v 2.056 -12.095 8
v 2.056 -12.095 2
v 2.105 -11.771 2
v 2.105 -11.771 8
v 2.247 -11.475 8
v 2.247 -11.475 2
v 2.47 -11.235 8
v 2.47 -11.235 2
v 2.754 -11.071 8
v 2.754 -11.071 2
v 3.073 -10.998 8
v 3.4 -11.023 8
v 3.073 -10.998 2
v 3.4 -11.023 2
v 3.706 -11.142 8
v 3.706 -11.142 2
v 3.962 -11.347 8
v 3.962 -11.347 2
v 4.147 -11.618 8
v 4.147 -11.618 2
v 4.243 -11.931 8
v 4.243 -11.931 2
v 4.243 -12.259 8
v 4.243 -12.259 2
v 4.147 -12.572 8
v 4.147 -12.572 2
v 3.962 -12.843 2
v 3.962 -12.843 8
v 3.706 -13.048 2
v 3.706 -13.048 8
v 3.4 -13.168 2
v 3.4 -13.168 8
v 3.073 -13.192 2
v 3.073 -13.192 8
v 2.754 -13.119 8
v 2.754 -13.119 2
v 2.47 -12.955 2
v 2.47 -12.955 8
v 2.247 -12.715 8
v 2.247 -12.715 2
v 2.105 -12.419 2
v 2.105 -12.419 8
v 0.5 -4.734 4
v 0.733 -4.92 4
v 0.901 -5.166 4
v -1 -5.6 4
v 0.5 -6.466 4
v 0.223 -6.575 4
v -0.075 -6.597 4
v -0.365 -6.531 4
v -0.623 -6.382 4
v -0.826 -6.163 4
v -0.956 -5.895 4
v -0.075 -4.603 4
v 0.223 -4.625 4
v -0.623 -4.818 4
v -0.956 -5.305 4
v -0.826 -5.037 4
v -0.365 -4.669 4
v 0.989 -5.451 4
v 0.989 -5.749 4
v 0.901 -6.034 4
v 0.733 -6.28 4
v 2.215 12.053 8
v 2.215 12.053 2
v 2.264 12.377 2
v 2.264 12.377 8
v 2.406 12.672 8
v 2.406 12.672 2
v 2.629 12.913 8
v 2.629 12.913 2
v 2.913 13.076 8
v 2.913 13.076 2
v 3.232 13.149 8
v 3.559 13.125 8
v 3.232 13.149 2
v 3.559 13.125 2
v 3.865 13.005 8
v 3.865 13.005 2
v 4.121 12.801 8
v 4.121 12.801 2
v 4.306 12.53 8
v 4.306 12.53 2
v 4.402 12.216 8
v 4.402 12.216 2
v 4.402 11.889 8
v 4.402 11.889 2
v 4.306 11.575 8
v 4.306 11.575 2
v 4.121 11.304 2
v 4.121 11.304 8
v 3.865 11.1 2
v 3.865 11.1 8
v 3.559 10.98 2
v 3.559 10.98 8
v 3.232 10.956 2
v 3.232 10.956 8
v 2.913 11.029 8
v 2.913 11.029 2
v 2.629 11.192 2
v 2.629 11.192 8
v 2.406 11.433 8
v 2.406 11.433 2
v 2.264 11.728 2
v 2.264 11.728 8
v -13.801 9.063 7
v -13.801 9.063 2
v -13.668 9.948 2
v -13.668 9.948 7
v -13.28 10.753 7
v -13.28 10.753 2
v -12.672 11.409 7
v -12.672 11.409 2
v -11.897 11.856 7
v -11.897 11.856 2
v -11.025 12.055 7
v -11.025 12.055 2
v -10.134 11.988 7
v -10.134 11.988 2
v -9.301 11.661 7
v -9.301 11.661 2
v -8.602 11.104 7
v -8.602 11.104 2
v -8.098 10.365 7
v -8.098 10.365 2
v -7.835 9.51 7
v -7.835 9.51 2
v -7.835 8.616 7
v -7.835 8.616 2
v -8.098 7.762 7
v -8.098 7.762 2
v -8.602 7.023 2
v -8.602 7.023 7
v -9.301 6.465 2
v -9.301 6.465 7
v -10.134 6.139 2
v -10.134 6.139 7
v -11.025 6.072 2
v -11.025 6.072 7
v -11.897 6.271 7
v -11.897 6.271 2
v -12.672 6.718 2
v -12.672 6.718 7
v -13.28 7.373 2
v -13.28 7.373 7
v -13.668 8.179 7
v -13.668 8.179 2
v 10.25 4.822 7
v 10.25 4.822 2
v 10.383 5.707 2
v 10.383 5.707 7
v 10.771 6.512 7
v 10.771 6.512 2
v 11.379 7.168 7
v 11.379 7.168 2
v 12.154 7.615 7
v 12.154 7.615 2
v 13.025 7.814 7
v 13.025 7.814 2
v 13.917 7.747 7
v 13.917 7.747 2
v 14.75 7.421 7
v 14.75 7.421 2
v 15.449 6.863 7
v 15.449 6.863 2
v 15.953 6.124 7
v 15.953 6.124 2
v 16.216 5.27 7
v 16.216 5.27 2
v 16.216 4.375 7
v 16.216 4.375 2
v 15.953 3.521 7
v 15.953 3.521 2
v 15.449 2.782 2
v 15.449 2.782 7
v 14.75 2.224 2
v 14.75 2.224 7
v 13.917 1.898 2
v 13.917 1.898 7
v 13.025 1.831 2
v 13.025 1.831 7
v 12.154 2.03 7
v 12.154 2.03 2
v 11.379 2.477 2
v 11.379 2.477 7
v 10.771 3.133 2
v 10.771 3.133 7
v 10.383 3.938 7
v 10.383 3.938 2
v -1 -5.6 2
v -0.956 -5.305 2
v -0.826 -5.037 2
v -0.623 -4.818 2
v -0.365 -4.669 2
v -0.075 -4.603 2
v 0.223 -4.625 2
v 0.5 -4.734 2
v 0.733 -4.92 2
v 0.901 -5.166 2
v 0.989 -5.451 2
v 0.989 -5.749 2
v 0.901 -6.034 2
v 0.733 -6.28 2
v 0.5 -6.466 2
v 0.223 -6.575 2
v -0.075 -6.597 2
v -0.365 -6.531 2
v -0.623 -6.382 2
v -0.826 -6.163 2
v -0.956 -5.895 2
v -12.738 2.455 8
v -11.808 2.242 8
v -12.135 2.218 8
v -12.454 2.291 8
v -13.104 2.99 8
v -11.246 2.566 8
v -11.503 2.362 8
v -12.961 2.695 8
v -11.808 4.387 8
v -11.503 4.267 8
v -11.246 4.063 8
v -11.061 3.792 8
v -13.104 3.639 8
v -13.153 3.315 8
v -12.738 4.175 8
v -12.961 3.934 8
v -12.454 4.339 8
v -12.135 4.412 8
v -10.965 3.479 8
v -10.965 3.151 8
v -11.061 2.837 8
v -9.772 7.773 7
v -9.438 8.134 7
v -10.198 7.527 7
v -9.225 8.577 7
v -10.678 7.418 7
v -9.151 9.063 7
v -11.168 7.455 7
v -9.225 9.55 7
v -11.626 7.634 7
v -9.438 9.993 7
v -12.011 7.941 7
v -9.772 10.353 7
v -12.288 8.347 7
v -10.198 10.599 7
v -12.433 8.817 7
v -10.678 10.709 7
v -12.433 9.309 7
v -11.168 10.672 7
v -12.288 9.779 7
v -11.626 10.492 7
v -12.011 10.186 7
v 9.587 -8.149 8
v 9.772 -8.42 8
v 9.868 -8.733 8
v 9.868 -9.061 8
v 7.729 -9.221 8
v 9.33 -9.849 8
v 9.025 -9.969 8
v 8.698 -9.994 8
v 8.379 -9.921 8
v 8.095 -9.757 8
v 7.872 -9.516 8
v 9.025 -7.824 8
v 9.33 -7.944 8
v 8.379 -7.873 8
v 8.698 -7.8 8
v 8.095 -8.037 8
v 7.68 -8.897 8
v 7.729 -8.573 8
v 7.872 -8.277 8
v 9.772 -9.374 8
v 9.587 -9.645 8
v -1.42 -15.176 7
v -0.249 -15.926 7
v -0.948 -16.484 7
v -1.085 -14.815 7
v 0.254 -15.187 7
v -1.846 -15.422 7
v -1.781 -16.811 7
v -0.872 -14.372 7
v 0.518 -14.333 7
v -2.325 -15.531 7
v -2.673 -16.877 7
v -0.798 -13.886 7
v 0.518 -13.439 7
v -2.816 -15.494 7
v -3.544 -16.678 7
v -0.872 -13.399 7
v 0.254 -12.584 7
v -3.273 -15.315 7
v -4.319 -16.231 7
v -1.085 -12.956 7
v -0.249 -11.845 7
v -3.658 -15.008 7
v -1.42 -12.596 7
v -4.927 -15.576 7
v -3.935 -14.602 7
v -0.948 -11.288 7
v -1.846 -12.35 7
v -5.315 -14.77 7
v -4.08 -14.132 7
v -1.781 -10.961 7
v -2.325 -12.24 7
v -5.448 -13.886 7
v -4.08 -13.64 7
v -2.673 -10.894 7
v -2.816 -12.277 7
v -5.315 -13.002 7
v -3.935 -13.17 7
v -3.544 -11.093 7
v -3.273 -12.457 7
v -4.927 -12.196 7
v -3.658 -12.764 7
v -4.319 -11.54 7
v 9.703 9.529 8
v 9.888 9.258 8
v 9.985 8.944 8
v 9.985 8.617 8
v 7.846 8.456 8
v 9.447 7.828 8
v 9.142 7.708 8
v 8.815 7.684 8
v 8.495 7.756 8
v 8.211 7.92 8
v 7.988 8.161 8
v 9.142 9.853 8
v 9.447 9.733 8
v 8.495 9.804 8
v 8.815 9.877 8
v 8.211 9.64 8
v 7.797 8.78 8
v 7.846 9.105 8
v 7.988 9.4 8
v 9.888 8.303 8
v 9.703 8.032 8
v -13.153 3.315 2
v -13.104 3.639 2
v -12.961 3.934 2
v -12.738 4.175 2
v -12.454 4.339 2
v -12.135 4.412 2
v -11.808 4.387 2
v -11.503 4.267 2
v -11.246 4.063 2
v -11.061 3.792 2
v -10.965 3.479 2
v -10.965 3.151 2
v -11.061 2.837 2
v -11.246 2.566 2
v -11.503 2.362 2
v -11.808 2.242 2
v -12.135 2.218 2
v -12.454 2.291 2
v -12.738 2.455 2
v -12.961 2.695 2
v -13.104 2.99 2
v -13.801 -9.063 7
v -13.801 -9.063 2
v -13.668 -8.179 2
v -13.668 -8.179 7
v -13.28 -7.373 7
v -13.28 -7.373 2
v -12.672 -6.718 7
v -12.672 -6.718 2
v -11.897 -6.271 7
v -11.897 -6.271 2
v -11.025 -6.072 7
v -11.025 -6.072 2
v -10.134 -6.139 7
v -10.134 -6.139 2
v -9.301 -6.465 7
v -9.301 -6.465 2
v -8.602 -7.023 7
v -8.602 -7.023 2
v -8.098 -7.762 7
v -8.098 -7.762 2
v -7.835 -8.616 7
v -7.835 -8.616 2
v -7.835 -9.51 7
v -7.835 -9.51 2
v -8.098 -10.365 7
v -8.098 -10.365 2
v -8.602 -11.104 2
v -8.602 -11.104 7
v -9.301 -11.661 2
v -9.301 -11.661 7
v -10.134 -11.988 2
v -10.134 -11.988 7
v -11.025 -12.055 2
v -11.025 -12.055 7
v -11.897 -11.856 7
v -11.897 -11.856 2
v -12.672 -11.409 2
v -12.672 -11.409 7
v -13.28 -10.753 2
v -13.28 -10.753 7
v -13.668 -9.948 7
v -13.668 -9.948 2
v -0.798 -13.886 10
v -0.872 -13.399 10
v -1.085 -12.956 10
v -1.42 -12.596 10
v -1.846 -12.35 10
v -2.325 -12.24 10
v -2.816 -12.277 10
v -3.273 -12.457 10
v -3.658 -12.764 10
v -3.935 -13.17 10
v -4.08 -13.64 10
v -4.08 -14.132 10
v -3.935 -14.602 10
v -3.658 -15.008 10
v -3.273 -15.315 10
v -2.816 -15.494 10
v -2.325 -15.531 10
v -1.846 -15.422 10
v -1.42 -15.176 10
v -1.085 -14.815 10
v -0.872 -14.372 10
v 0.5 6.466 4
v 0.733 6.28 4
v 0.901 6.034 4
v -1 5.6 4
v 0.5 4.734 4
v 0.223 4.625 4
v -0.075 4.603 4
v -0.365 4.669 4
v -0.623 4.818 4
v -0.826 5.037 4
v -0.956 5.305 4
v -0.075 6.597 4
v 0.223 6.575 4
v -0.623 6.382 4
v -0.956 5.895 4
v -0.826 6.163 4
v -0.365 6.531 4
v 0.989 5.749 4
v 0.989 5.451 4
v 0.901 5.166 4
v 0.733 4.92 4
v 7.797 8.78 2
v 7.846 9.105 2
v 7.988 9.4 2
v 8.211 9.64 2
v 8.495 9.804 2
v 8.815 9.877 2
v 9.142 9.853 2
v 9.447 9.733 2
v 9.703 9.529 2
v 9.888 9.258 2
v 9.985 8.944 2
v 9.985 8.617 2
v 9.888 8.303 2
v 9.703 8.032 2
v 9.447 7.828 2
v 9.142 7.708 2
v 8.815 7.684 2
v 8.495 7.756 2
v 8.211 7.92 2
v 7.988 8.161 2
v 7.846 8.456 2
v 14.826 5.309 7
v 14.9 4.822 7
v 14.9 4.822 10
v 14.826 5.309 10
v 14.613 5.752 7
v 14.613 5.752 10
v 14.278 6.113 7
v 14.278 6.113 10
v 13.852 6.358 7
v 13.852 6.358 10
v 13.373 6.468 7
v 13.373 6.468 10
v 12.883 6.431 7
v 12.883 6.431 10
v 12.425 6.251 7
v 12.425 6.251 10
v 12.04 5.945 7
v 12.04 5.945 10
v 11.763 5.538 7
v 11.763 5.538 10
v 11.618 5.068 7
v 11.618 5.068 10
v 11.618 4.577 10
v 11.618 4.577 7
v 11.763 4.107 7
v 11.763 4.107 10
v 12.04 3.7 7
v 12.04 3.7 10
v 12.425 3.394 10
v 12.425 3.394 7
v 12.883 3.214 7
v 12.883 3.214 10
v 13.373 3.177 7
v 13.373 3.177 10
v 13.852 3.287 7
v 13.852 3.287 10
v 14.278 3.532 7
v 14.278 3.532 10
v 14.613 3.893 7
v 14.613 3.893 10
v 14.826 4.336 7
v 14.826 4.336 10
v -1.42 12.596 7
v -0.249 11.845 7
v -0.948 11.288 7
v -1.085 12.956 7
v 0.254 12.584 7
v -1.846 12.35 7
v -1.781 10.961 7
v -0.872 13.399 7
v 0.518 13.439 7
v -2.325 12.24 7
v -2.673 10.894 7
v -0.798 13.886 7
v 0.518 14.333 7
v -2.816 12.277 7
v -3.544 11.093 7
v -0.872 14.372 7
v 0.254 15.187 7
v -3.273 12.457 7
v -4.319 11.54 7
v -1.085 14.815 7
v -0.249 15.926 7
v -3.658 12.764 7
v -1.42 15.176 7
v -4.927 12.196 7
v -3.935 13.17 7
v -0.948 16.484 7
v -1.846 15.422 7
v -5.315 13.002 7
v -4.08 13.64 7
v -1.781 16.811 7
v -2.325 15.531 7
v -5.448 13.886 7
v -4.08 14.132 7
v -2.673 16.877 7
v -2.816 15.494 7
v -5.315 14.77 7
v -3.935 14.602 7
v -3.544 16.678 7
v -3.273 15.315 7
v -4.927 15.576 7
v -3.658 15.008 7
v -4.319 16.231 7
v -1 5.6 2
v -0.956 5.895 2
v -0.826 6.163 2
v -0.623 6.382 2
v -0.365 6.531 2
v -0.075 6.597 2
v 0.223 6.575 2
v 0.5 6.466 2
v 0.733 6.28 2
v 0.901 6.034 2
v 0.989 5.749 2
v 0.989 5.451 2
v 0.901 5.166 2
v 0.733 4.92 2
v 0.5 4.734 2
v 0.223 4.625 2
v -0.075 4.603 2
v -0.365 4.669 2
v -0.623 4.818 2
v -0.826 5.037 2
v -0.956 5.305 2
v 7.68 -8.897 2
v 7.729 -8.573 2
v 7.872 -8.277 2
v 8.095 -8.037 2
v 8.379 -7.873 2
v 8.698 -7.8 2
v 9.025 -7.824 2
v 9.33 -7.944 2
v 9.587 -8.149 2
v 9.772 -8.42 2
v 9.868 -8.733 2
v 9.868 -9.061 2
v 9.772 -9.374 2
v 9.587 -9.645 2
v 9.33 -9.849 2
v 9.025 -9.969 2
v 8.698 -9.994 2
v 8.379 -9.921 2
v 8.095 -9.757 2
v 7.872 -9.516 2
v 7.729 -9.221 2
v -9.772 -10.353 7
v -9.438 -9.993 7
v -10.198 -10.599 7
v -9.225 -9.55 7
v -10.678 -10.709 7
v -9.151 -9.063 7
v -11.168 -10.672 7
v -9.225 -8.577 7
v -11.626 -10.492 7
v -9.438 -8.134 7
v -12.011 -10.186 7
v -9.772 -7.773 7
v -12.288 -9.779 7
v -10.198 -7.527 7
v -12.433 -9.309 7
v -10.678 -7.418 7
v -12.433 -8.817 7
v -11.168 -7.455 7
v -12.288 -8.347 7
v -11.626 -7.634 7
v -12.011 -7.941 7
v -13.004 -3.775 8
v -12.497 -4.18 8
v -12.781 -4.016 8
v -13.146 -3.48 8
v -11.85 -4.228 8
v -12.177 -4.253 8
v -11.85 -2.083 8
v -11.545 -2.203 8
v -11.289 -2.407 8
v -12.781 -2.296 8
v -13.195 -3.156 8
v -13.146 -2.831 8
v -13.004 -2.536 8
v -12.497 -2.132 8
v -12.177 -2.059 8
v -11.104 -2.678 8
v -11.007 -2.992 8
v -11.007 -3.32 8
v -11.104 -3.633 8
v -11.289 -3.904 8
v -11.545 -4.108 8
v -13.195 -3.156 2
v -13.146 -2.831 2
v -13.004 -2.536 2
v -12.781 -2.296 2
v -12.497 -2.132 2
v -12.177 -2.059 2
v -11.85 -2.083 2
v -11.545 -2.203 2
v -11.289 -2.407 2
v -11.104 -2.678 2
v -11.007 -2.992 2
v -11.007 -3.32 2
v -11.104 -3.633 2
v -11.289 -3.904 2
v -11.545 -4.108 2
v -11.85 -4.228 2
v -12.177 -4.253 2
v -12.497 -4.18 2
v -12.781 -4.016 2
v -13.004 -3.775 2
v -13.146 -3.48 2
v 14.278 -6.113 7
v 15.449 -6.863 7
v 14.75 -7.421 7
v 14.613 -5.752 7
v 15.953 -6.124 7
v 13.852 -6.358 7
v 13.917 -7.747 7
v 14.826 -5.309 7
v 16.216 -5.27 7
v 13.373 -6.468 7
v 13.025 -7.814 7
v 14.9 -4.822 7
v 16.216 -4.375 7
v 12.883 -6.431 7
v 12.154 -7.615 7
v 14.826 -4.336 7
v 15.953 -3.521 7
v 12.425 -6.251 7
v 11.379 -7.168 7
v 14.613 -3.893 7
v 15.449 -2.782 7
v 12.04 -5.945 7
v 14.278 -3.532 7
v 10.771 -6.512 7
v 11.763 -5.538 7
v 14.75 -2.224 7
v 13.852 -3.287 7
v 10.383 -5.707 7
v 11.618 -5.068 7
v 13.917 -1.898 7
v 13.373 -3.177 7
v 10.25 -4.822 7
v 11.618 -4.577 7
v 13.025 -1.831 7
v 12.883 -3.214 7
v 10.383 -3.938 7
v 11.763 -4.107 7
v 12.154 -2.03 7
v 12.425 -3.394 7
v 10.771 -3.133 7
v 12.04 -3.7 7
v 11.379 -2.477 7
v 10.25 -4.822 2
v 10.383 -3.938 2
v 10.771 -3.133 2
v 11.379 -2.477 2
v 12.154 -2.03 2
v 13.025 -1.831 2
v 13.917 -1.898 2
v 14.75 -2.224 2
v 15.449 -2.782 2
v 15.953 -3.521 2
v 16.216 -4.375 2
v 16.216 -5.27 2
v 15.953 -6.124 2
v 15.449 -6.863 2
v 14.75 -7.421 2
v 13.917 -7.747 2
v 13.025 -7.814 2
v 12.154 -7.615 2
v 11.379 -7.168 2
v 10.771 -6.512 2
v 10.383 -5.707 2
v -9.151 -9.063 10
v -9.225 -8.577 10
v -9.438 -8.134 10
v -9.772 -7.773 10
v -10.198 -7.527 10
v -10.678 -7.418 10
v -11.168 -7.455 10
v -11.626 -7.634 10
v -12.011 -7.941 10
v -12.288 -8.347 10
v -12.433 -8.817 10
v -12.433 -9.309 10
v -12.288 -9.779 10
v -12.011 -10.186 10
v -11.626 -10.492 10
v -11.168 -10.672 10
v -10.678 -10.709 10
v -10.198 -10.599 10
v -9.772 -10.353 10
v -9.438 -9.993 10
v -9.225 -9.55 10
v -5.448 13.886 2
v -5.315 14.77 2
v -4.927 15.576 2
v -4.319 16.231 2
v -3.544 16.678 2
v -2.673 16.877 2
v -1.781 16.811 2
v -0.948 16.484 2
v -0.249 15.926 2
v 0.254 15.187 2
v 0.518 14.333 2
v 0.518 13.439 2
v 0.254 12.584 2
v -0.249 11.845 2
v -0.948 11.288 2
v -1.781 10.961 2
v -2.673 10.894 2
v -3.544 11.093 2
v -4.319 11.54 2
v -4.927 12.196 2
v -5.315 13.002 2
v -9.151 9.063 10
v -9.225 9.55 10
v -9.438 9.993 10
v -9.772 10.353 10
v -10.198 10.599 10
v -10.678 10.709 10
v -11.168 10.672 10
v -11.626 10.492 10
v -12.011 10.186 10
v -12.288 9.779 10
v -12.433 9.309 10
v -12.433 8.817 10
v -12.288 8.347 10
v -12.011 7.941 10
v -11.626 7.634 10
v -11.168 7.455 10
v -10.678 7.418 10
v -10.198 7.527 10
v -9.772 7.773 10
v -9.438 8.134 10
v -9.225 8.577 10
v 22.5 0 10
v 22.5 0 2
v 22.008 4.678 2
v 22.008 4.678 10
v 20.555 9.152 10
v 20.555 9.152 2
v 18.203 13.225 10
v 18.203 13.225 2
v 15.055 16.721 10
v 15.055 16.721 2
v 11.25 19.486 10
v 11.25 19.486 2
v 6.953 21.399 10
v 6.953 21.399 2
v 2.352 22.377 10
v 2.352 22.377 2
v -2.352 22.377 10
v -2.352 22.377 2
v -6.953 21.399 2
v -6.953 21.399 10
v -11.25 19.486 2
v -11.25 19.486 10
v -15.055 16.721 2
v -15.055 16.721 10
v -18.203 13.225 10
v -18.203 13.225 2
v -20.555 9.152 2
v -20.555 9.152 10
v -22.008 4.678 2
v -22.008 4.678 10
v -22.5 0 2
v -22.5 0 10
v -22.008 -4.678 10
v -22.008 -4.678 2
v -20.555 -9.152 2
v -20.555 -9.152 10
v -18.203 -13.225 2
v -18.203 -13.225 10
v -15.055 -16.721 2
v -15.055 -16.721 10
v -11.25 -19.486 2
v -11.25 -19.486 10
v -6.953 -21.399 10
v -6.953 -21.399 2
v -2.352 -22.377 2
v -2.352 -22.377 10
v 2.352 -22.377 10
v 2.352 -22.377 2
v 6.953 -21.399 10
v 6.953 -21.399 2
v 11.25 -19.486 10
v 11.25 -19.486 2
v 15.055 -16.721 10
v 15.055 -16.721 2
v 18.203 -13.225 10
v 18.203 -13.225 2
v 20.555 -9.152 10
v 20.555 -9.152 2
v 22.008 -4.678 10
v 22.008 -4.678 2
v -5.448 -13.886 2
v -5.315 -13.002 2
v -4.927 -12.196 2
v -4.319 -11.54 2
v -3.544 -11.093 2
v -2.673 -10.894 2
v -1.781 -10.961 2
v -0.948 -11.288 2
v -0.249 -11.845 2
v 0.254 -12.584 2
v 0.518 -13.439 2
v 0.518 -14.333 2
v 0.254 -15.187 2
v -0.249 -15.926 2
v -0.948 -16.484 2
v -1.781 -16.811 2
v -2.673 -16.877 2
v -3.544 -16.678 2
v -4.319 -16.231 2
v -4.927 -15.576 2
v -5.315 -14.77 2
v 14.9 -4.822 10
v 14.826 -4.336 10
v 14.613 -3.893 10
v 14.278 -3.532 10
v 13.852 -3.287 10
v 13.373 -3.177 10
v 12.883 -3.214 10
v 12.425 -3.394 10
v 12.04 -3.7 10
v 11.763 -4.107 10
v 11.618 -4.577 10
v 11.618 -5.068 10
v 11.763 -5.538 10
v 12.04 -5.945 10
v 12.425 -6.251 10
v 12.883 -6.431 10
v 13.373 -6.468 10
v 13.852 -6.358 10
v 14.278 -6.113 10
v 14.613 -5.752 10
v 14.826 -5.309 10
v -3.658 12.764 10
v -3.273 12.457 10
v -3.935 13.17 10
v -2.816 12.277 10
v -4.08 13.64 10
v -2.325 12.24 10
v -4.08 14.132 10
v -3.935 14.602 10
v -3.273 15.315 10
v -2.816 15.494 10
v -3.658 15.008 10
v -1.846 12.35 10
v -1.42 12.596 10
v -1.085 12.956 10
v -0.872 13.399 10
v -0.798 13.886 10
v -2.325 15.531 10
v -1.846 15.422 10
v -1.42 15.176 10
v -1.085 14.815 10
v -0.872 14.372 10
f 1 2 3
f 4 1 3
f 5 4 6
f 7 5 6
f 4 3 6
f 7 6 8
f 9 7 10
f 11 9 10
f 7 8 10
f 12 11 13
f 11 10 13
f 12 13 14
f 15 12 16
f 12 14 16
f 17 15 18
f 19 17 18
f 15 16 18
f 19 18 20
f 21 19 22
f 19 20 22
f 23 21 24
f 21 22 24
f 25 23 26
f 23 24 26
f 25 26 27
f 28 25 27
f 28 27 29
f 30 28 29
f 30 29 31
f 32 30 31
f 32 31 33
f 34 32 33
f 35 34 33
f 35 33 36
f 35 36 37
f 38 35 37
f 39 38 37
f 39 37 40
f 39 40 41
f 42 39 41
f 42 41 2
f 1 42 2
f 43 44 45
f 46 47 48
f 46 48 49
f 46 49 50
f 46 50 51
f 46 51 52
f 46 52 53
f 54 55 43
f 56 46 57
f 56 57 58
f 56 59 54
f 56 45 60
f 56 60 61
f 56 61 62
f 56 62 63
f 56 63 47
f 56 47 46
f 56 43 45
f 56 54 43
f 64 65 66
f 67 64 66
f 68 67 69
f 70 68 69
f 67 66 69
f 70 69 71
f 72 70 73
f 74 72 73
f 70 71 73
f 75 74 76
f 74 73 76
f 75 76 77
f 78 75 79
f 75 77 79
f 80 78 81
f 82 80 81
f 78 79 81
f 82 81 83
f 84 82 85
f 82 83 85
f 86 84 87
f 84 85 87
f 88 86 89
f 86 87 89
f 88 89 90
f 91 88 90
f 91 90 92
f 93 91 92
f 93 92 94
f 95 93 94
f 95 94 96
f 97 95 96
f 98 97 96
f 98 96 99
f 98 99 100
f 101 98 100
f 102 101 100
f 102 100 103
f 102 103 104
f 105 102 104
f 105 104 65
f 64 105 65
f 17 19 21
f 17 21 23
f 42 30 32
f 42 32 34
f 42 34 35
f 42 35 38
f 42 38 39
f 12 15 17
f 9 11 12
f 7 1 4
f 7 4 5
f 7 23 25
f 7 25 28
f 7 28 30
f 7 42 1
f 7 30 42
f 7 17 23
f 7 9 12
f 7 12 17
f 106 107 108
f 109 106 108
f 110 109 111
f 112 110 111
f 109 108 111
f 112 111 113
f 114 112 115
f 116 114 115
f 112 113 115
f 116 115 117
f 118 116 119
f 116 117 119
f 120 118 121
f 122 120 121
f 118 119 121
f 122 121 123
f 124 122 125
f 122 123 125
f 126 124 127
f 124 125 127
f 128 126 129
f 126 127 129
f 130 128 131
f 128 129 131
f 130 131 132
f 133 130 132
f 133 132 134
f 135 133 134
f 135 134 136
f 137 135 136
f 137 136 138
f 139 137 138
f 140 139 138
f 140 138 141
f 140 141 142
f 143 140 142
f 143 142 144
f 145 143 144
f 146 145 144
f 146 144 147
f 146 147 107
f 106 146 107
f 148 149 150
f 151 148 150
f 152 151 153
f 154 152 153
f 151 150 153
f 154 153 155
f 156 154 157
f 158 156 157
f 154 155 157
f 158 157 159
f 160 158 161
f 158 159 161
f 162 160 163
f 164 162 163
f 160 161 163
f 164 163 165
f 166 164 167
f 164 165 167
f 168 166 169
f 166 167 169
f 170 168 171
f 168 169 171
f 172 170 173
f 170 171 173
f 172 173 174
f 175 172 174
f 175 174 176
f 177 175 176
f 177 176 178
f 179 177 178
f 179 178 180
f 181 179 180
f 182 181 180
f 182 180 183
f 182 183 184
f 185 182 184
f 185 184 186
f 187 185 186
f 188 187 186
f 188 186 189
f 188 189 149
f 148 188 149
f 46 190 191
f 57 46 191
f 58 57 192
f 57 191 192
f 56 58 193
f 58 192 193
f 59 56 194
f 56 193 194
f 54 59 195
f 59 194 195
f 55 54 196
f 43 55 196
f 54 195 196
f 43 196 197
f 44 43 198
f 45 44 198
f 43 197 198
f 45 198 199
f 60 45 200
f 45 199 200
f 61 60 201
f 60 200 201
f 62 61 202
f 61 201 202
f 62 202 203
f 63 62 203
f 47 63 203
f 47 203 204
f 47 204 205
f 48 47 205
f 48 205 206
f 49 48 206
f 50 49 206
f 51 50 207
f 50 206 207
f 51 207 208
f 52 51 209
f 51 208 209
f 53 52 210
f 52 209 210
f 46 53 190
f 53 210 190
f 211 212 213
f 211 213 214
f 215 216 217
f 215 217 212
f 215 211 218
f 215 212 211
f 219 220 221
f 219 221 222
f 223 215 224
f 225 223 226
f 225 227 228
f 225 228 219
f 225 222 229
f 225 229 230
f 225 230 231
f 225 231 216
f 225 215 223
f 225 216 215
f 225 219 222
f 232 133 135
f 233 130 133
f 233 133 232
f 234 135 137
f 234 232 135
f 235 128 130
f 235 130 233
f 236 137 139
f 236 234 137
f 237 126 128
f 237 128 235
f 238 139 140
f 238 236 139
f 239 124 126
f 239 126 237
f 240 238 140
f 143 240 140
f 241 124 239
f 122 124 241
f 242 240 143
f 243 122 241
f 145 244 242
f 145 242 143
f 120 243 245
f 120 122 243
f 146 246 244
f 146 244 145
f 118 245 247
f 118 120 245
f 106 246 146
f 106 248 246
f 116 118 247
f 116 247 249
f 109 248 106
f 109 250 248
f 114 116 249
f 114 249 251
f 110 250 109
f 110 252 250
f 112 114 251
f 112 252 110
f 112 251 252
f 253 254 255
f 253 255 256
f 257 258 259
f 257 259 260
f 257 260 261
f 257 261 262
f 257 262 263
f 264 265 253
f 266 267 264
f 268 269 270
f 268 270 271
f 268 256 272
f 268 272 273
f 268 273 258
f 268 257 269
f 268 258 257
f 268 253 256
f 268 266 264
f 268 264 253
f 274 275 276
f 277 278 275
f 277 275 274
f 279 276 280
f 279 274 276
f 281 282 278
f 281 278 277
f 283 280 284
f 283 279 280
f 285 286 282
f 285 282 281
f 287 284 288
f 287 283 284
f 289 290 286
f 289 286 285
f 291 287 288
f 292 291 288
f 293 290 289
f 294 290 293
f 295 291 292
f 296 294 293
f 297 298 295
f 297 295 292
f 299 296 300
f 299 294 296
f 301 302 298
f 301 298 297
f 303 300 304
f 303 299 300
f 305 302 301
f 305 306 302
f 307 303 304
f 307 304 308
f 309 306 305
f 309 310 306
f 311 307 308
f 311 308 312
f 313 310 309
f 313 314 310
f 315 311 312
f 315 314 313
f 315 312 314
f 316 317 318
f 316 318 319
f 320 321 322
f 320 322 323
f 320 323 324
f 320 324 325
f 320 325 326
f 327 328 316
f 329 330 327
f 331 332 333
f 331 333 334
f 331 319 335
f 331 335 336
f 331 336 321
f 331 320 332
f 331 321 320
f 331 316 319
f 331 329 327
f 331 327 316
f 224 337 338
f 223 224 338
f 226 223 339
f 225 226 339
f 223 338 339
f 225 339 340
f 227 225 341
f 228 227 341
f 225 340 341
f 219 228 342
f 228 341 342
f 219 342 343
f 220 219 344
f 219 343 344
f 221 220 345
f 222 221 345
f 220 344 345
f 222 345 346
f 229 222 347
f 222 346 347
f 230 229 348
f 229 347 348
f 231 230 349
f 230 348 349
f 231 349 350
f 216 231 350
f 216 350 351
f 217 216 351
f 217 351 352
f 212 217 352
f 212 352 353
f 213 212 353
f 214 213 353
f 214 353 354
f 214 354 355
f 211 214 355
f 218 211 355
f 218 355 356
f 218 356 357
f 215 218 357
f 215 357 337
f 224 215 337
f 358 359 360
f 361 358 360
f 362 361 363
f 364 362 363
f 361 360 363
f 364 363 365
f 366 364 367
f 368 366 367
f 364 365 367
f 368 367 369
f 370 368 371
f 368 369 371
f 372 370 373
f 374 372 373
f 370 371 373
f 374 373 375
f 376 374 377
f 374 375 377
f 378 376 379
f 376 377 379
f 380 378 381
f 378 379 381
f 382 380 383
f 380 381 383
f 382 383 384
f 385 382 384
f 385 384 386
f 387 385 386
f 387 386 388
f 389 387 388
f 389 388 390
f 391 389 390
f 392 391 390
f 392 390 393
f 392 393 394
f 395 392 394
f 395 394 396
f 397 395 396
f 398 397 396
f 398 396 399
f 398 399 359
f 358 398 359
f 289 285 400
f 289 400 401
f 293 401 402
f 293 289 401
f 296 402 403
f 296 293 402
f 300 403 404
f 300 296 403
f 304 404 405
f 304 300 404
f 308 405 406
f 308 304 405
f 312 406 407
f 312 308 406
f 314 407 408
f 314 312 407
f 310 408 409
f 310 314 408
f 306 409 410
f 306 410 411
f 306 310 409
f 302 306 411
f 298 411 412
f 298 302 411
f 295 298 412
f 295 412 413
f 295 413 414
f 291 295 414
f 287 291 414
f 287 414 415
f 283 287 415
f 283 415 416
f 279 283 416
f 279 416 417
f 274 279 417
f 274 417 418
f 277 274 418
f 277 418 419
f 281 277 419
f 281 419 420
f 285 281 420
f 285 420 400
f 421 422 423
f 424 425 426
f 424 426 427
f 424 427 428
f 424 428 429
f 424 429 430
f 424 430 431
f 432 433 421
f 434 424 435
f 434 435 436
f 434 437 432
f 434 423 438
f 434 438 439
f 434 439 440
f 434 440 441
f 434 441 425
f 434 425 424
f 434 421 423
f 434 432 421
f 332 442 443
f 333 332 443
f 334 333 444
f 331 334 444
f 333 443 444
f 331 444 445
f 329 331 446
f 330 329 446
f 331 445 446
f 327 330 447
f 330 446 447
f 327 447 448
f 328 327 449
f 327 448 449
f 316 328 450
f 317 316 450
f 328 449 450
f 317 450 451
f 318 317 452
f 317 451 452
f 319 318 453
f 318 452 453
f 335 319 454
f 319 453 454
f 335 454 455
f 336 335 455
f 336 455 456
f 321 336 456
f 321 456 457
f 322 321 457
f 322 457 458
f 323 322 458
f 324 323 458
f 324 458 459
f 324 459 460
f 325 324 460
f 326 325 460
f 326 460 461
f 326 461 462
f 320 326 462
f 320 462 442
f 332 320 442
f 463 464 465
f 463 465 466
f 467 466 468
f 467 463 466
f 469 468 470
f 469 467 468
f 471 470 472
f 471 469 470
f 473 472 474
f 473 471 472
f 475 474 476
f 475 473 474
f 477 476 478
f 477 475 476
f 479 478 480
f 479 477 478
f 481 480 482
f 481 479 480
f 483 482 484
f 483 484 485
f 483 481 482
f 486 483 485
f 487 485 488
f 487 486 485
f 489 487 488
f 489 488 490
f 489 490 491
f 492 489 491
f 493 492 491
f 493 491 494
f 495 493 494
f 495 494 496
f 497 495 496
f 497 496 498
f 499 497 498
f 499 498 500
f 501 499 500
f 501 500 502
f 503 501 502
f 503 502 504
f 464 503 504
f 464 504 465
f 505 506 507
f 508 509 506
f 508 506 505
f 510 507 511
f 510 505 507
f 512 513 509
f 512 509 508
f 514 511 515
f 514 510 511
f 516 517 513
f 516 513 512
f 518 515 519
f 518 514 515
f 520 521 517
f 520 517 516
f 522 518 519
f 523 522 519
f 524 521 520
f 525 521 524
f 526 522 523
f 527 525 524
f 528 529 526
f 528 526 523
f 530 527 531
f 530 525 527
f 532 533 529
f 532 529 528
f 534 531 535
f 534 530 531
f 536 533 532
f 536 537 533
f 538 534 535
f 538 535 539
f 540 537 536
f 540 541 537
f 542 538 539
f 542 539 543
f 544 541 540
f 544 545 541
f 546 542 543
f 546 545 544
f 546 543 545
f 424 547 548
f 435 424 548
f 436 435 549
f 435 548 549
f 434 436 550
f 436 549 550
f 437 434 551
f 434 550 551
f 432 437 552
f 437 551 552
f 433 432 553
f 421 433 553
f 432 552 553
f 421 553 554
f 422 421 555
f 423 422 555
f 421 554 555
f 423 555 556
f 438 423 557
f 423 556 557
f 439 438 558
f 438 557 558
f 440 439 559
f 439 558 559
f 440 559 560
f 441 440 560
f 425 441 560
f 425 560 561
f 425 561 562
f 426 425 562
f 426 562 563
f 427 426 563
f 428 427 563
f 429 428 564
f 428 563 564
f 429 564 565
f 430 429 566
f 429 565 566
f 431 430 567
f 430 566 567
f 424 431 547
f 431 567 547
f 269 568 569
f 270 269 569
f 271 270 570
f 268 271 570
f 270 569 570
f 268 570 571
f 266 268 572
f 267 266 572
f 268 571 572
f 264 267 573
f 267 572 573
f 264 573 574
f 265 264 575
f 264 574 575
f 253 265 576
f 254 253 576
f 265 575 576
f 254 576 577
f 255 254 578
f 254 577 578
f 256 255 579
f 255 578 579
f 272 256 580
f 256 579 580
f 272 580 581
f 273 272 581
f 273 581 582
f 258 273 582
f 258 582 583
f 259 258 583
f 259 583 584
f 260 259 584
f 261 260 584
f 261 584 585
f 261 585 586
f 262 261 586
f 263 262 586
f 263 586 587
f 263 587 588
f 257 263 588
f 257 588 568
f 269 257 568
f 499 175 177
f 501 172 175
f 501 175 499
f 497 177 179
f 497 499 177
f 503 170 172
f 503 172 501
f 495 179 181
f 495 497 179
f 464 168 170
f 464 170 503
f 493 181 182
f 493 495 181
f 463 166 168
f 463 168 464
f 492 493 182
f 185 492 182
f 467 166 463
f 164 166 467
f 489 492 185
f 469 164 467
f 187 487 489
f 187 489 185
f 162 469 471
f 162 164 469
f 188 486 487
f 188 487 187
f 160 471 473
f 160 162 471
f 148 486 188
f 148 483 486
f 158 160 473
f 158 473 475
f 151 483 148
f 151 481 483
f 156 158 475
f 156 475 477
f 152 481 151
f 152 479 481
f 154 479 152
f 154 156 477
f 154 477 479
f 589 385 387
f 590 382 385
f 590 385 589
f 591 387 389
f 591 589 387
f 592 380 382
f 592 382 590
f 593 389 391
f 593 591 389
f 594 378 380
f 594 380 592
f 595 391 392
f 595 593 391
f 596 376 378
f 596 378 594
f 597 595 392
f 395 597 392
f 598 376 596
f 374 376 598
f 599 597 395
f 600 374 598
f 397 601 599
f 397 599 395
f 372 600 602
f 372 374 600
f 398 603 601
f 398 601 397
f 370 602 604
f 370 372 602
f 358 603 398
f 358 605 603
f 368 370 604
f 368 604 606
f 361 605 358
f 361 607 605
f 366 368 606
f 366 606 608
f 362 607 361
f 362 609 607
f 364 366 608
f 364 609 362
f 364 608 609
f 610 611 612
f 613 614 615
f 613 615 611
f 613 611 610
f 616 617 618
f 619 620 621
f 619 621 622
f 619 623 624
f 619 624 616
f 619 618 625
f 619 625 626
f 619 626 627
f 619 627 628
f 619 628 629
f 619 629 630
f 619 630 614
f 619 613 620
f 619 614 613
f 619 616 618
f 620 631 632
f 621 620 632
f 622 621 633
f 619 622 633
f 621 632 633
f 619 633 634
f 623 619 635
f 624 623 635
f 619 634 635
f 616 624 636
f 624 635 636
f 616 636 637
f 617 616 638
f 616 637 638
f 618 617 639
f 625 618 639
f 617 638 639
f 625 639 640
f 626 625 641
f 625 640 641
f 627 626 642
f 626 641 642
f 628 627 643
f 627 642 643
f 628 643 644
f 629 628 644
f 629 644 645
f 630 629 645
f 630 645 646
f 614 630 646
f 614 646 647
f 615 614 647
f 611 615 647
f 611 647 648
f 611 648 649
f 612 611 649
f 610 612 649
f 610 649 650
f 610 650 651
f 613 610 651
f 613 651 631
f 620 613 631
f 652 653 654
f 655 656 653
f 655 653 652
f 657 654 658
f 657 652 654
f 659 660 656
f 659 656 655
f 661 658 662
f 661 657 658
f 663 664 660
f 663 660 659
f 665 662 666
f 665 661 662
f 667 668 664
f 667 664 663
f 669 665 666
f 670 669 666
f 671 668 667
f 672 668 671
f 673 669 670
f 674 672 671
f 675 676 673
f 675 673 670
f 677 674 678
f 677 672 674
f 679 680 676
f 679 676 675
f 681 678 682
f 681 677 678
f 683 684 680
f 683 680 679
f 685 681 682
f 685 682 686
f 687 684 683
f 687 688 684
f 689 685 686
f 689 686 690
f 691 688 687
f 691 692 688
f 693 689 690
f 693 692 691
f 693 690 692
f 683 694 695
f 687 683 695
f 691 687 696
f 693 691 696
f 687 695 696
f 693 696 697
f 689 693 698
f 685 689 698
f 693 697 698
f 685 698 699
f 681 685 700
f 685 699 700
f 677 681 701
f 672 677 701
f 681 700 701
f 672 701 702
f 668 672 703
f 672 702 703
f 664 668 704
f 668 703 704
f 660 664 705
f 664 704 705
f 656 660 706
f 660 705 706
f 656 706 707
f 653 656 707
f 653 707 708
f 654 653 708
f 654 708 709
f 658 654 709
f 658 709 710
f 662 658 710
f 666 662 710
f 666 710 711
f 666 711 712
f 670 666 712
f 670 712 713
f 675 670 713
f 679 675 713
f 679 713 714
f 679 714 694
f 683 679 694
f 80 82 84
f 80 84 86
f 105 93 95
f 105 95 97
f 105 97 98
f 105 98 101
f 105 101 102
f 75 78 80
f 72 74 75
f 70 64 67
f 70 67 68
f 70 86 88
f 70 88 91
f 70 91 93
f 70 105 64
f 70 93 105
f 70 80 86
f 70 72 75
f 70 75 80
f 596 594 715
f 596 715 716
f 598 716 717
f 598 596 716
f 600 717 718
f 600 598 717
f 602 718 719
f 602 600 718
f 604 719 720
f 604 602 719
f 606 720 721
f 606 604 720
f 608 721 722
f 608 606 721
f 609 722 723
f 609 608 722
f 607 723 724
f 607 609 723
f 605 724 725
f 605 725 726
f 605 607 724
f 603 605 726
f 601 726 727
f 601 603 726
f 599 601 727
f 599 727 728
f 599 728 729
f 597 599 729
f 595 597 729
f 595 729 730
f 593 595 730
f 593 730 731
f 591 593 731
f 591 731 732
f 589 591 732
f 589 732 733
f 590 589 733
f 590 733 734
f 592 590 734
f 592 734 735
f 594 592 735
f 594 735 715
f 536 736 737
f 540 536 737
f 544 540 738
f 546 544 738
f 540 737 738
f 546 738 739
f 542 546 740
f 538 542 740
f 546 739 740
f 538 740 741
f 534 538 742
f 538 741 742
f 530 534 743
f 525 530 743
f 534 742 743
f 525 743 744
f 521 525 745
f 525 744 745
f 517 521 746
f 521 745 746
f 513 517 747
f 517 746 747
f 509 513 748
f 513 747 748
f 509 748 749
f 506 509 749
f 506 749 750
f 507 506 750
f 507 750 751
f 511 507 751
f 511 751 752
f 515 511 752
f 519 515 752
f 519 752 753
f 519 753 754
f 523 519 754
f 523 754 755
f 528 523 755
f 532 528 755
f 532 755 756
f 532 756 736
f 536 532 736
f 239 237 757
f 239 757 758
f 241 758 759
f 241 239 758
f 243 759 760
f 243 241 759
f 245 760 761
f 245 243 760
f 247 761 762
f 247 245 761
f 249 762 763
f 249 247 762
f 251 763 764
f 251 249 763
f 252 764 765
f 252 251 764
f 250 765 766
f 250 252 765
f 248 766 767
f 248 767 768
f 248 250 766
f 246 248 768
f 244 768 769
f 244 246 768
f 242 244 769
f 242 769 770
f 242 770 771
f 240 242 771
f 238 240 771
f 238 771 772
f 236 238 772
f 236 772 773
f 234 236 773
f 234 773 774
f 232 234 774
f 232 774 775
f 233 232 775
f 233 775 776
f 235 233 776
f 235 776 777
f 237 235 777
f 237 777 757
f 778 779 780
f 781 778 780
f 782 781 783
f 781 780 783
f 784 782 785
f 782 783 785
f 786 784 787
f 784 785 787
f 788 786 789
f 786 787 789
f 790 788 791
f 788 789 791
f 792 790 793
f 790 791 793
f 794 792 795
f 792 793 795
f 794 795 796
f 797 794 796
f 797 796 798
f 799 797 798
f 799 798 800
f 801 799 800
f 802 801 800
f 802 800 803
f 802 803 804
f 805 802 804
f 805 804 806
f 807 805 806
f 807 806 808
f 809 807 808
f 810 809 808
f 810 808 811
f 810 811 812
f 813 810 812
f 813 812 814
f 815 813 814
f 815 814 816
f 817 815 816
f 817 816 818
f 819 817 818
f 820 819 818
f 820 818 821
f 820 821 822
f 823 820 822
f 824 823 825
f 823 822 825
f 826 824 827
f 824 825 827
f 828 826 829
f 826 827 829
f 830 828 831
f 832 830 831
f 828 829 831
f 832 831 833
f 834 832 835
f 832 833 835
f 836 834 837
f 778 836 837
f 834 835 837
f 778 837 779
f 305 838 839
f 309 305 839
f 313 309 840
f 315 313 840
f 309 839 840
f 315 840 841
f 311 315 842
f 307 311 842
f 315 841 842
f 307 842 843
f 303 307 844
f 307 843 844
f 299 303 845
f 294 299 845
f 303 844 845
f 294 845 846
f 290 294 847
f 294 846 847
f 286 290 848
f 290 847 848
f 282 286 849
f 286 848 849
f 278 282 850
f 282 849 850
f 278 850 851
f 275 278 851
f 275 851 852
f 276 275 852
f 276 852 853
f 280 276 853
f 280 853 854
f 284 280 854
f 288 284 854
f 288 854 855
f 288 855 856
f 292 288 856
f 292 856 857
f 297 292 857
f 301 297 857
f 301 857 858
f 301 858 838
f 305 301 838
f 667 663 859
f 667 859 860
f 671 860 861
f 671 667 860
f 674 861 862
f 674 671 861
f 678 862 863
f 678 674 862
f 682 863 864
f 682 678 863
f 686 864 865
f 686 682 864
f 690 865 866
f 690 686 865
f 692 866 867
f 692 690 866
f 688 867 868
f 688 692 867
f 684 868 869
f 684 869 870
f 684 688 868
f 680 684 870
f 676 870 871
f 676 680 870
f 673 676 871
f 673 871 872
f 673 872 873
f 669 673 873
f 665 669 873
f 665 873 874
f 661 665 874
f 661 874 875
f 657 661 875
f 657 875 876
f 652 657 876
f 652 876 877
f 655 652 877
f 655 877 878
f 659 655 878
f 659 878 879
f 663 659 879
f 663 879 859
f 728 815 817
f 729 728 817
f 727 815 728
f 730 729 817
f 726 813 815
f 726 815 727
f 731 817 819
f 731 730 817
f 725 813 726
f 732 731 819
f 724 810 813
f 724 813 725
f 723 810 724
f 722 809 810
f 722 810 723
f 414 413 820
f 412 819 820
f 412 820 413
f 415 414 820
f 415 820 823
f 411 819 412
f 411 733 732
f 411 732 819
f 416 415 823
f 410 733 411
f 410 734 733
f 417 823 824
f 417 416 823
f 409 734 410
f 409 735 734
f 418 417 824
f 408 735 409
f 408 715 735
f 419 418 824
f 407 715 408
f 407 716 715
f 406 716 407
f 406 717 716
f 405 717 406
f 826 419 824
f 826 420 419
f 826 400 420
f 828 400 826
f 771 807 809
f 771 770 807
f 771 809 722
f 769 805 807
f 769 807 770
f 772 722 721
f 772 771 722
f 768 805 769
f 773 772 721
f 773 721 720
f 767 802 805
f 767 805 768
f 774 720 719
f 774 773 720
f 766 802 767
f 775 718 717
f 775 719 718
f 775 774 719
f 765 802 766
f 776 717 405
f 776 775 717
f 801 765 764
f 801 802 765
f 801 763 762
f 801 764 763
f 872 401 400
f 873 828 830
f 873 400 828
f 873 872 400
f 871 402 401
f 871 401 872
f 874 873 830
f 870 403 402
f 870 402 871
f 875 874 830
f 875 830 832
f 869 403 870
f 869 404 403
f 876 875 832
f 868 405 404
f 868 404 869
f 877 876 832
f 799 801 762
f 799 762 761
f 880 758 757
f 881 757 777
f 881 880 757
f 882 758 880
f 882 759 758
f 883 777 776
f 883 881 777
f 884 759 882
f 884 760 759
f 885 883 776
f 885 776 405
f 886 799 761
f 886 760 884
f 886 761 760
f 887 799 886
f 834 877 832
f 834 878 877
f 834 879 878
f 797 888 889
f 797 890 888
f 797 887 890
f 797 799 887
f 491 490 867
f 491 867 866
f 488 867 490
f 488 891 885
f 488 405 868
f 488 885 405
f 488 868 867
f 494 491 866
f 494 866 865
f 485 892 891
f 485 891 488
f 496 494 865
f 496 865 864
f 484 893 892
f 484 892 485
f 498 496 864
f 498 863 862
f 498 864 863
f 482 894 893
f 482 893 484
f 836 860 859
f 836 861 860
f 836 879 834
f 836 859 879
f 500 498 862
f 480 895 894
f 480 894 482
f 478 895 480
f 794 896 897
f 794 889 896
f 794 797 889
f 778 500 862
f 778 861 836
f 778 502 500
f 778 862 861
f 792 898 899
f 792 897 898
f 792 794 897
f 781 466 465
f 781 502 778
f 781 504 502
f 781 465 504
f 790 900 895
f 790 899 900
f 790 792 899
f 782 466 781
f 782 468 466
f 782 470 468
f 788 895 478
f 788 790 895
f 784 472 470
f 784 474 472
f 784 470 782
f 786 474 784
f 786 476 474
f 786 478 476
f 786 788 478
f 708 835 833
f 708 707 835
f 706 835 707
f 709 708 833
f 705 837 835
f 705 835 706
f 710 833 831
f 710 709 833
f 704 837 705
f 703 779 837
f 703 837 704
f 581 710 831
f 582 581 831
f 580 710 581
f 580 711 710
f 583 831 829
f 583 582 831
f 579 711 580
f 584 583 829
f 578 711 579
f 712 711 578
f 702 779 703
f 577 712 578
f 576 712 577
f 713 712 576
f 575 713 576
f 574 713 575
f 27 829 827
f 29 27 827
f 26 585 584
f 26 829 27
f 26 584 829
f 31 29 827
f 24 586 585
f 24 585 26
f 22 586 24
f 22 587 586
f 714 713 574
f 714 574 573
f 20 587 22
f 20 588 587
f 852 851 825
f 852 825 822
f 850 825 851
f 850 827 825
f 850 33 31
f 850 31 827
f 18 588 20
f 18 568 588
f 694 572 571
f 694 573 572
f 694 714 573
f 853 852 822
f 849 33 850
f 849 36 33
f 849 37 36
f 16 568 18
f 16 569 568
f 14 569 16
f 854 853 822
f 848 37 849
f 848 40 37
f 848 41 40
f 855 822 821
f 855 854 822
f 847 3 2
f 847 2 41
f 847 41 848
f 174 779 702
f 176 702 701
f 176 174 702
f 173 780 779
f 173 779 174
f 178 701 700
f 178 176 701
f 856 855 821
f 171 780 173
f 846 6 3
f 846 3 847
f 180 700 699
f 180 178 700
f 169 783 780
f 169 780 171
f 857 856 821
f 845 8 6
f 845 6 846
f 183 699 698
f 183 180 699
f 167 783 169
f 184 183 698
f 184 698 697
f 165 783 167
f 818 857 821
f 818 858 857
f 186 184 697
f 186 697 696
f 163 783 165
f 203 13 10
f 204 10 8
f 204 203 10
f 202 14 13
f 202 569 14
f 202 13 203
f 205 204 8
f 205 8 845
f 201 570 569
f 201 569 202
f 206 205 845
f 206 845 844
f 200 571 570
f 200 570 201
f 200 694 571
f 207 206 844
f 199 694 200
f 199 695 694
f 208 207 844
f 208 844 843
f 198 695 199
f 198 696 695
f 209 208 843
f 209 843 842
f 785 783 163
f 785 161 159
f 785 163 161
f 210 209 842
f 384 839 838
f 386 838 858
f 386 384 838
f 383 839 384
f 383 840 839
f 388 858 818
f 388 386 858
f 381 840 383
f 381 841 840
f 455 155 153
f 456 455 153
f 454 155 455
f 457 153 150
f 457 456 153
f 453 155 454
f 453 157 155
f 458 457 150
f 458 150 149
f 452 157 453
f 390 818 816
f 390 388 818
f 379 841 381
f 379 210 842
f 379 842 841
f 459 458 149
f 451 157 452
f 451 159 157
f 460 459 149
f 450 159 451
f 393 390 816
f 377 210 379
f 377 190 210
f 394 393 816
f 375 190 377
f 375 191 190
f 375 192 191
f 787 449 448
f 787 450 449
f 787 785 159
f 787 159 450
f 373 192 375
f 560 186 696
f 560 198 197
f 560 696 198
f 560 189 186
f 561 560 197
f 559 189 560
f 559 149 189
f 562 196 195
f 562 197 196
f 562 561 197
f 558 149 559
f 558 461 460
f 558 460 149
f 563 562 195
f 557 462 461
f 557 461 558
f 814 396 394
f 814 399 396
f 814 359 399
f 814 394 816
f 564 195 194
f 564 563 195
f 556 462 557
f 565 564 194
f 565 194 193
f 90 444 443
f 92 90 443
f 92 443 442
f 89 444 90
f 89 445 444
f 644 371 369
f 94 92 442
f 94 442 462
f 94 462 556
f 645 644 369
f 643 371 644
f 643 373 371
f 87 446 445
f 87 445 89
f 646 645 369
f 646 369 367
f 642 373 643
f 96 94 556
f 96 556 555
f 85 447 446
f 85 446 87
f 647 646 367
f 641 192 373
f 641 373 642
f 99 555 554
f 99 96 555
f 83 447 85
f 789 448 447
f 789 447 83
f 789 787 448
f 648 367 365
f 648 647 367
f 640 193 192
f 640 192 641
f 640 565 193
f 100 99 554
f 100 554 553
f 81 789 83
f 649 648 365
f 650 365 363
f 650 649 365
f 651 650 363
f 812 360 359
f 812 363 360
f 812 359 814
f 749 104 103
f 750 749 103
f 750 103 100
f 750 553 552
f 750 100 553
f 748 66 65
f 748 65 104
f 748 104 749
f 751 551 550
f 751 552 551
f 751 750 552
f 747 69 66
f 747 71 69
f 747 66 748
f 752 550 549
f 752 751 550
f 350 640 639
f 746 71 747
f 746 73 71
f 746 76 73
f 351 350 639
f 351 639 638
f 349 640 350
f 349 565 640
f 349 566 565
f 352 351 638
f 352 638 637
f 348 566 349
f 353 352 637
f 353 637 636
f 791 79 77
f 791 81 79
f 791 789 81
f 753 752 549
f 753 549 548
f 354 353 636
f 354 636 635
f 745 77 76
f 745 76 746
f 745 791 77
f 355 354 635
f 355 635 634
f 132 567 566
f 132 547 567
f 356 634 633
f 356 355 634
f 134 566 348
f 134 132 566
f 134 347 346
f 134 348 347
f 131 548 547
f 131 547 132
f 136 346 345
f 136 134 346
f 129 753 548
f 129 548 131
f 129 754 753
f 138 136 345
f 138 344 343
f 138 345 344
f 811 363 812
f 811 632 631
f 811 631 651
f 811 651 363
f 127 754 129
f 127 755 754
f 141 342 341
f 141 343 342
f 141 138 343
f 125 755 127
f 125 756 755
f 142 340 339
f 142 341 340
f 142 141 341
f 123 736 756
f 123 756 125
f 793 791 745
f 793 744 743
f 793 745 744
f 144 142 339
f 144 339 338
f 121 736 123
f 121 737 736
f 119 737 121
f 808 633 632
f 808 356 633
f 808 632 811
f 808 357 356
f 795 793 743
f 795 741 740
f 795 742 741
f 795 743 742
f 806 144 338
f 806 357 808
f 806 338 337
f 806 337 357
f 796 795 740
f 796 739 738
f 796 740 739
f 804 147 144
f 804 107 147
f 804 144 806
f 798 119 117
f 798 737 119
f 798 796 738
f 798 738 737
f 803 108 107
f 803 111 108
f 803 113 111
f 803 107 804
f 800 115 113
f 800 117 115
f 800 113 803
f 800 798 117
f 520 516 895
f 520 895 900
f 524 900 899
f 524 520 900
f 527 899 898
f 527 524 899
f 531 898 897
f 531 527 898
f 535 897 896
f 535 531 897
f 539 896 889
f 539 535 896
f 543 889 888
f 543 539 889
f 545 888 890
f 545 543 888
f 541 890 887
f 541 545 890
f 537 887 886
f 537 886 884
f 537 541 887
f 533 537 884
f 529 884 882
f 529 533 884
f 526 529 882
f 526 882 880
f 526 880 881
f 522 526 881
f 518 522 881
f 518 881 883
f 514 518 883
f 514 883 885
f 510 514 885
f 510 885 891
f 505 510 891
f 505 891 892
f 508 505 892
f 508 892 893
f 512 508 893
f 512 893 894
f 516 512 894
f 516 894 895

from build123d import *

# Parameters (mm, degrees)
SKETCH_1_R          = 22.5
SKETCH_1_R_2        = 1.65
EXTRUDE_1_DEPTH     = 10
SKETCH_3_R          = 3
CUT_EXTRUDE_1_DEPTH = 7
SKETCH_4_R          = 1.1
CUT_EXTRUDE_2_DEPTH = 8
SKETCH_5_R          = 22.5
SKETCH_5_R_2        = 3
SKETCH_5_R_3        = 1.1
CUT_EXTRUDE_3_DEPTH = 2
SKETCH_6_R          = 1
CUT_EXTRUDE_4_DEPTH = 2


with BuildPart() as part:
    # 스케치1 → 보스-돌출1 (new body)
    with BuildSketch(Plane.XY):
        Circle(SKETCH_1_R)
        with Locations((-2.448439305, 13.885789317)):
            Circle(SKETCH_1_R_2, mode=Mode.SUBTRACT)
        with Locations((-10.801226648, 9.063305297)):
            Circle(SKETCH_1_R_2, mode=Mode.SUBTRACT)
        with Locations((13.249665953, 4.822484021)):
            Circle(SKETCH_1_R_2, mode=Mode.SUBTRACT)
        with Locations((13.249665953, -4.822484021)):
            Circle(SKETCH_1_R_2, mode=Mode.SUBTRACT)
        with Locations((-2.448439305, -13.885789317)):
            Circle(SKETCH_1_R_2, mode=Mode.SUBTRACT)
        with Locations((-10.801226648, -9.063305297)):
            Circle(SKETCH_1_R_2, mode=Mode.SUBTRACT)
    extrude(amount=EXTRUDE_1_DEPTH)

    # 스케치3 → 컷-돌출1 (cut)
    with BuildSketch(Plane(origin=(0, 0, 0), x_dir=(-1, 0, 0), z_dir=(0, 0, -1))):
        with Locations((2.448439305, 13.885789317)):
            Circle(SKETCH_3_R)
        with Locations((10.801226648, 9.063305297)):
            Circle(SKETCH_3_R)
        with Locations((10.801226648, -9.063305297)):
            Circle(SKETCH_3_R)
        with Locations((2.448439305, -13.885789317)):
            Circle(SKETCH_3_R)
        with Locations((-13.249665953, -4.822484021)):
            Circle(SKETCH_3_R)
        with Locations((-13.249665953, 4.822484021)):
            Circle(SKETCH_3_R)
    extrude(amount=-CUT_EXTRUDE_1_DEPTH, mode=Mode.SUBTRACT)

    # 스케치4 → 컷-돌출2 (cut)
    with BuildSketch(Plane(origin=(0, 0, 0), x_dir=(-1, 0, 0), z_dir=(0, 0, -1))):
        with Locations((12.052513913, 3.314650565)):
            Circle(SKETCH_4_R)
        with Locations((12.095108511, -3.155685363)):
            Circle(SKETCH_4_R)
        with Locations((-3.155685363, -12.095108511)):
            Circle(SKETCH_4_R)
        with Locations((-8.780457946, -8.896828551)):
            Circle(SKETCH_4_R)
        with Locations((-8.896828551, 8.780457946)):
            Circle(SKETCH_4_R)
        with Locations((-3.314650565, 12.052513913)):
            Circle(SKETCH_4_R)
    extrude(amount=-CUT_EXTRUDE_2_DEPTH, mode=Mode.SUBTRACT)

    # 스케치5 → 컷-돌출3 (cut)
    with BuildSketch(Plane(origin=(0, 0, 0), x_dir=(-1, 0, 0), z_dir=(0, 0, -1))):
        Circle(SKETCH_5_R)
        with Locations((2.448439305, 13.885789317)):
            Circle(SKETCH_5_R_2, mode=Mode.SUBTRACT)
        with Locations((10.801226648, 9.063305297)):
            Circle(SKETCH_5_R_2, mode=Mode.SUBTRACT)
        with Locations((12.052513913, 3.314650565)):
            Circle(SKETCH_5_R_3, mode=Mode.SUBTRACT)
        with Locations((12.095108511, -3.155685363)):
            Circle(SKETCH_5_R_3, mode=Mode.SUBTRACT)
        with Locations((10.801226648, -9.063305297)):
            Circle(SKETCH_5_R_2, mode=Mode.SUBTRACT)
        with Locations((2.448439305, -13.885789317)):
            Circle(SKETCH_5_R_2, mode=Mode.SUBTRACT)
        with Locations((-3.155685363, -12.095108511)):
            Circle(SKETCH_5_R_3, mode=Mode.SUBTRACT)
        with Locations((-8.780457946, -8.896828551)):
            Circle(SKETCH_5_R_3, mode=Mode.SUBTRACT)
        with Locations((-13.249665953, -4.822484021)):
            Circle(SKETCH_5_R_2, mode=Mode.SUBTRACT)
        with Locations((-13.249665953, 4.822484021)):
            Circle(SKETCH_5_R_2, mode=Mode.SUBTRACT)
        with Locations((-8.896828551, 8.780457946)):
            Circle(SKETCH_5_R_3, mode=Mode.SUBTRACT)
        with Locations((-3.314650565, 12.052513913)):
            Circle(SKETCH_5_R_3, mode=Mode.SUBTRACT)
    extrude(amount=-CUT_EXTRUDE_3_DEPTH, mode=Mode.SUBTRACT)

    # 스케치6 → 컷-돌출4 (cut)
    with BuildSketch(Plane(origin=(0, 0, 2), x_dir=(-1, 0, 0), z_dir=(0, 0, -1))):
        with Locations((0, 5.6)):
            Circle(SKETCH_6_R)
        with Locations((0, -5.6)):
            Circle(SKETCH_6_R)
    extrude(amount=-CUT_EXTRUDE_4_DEPTH, mode=Mode.SUBTRACT)


solid = part.part
